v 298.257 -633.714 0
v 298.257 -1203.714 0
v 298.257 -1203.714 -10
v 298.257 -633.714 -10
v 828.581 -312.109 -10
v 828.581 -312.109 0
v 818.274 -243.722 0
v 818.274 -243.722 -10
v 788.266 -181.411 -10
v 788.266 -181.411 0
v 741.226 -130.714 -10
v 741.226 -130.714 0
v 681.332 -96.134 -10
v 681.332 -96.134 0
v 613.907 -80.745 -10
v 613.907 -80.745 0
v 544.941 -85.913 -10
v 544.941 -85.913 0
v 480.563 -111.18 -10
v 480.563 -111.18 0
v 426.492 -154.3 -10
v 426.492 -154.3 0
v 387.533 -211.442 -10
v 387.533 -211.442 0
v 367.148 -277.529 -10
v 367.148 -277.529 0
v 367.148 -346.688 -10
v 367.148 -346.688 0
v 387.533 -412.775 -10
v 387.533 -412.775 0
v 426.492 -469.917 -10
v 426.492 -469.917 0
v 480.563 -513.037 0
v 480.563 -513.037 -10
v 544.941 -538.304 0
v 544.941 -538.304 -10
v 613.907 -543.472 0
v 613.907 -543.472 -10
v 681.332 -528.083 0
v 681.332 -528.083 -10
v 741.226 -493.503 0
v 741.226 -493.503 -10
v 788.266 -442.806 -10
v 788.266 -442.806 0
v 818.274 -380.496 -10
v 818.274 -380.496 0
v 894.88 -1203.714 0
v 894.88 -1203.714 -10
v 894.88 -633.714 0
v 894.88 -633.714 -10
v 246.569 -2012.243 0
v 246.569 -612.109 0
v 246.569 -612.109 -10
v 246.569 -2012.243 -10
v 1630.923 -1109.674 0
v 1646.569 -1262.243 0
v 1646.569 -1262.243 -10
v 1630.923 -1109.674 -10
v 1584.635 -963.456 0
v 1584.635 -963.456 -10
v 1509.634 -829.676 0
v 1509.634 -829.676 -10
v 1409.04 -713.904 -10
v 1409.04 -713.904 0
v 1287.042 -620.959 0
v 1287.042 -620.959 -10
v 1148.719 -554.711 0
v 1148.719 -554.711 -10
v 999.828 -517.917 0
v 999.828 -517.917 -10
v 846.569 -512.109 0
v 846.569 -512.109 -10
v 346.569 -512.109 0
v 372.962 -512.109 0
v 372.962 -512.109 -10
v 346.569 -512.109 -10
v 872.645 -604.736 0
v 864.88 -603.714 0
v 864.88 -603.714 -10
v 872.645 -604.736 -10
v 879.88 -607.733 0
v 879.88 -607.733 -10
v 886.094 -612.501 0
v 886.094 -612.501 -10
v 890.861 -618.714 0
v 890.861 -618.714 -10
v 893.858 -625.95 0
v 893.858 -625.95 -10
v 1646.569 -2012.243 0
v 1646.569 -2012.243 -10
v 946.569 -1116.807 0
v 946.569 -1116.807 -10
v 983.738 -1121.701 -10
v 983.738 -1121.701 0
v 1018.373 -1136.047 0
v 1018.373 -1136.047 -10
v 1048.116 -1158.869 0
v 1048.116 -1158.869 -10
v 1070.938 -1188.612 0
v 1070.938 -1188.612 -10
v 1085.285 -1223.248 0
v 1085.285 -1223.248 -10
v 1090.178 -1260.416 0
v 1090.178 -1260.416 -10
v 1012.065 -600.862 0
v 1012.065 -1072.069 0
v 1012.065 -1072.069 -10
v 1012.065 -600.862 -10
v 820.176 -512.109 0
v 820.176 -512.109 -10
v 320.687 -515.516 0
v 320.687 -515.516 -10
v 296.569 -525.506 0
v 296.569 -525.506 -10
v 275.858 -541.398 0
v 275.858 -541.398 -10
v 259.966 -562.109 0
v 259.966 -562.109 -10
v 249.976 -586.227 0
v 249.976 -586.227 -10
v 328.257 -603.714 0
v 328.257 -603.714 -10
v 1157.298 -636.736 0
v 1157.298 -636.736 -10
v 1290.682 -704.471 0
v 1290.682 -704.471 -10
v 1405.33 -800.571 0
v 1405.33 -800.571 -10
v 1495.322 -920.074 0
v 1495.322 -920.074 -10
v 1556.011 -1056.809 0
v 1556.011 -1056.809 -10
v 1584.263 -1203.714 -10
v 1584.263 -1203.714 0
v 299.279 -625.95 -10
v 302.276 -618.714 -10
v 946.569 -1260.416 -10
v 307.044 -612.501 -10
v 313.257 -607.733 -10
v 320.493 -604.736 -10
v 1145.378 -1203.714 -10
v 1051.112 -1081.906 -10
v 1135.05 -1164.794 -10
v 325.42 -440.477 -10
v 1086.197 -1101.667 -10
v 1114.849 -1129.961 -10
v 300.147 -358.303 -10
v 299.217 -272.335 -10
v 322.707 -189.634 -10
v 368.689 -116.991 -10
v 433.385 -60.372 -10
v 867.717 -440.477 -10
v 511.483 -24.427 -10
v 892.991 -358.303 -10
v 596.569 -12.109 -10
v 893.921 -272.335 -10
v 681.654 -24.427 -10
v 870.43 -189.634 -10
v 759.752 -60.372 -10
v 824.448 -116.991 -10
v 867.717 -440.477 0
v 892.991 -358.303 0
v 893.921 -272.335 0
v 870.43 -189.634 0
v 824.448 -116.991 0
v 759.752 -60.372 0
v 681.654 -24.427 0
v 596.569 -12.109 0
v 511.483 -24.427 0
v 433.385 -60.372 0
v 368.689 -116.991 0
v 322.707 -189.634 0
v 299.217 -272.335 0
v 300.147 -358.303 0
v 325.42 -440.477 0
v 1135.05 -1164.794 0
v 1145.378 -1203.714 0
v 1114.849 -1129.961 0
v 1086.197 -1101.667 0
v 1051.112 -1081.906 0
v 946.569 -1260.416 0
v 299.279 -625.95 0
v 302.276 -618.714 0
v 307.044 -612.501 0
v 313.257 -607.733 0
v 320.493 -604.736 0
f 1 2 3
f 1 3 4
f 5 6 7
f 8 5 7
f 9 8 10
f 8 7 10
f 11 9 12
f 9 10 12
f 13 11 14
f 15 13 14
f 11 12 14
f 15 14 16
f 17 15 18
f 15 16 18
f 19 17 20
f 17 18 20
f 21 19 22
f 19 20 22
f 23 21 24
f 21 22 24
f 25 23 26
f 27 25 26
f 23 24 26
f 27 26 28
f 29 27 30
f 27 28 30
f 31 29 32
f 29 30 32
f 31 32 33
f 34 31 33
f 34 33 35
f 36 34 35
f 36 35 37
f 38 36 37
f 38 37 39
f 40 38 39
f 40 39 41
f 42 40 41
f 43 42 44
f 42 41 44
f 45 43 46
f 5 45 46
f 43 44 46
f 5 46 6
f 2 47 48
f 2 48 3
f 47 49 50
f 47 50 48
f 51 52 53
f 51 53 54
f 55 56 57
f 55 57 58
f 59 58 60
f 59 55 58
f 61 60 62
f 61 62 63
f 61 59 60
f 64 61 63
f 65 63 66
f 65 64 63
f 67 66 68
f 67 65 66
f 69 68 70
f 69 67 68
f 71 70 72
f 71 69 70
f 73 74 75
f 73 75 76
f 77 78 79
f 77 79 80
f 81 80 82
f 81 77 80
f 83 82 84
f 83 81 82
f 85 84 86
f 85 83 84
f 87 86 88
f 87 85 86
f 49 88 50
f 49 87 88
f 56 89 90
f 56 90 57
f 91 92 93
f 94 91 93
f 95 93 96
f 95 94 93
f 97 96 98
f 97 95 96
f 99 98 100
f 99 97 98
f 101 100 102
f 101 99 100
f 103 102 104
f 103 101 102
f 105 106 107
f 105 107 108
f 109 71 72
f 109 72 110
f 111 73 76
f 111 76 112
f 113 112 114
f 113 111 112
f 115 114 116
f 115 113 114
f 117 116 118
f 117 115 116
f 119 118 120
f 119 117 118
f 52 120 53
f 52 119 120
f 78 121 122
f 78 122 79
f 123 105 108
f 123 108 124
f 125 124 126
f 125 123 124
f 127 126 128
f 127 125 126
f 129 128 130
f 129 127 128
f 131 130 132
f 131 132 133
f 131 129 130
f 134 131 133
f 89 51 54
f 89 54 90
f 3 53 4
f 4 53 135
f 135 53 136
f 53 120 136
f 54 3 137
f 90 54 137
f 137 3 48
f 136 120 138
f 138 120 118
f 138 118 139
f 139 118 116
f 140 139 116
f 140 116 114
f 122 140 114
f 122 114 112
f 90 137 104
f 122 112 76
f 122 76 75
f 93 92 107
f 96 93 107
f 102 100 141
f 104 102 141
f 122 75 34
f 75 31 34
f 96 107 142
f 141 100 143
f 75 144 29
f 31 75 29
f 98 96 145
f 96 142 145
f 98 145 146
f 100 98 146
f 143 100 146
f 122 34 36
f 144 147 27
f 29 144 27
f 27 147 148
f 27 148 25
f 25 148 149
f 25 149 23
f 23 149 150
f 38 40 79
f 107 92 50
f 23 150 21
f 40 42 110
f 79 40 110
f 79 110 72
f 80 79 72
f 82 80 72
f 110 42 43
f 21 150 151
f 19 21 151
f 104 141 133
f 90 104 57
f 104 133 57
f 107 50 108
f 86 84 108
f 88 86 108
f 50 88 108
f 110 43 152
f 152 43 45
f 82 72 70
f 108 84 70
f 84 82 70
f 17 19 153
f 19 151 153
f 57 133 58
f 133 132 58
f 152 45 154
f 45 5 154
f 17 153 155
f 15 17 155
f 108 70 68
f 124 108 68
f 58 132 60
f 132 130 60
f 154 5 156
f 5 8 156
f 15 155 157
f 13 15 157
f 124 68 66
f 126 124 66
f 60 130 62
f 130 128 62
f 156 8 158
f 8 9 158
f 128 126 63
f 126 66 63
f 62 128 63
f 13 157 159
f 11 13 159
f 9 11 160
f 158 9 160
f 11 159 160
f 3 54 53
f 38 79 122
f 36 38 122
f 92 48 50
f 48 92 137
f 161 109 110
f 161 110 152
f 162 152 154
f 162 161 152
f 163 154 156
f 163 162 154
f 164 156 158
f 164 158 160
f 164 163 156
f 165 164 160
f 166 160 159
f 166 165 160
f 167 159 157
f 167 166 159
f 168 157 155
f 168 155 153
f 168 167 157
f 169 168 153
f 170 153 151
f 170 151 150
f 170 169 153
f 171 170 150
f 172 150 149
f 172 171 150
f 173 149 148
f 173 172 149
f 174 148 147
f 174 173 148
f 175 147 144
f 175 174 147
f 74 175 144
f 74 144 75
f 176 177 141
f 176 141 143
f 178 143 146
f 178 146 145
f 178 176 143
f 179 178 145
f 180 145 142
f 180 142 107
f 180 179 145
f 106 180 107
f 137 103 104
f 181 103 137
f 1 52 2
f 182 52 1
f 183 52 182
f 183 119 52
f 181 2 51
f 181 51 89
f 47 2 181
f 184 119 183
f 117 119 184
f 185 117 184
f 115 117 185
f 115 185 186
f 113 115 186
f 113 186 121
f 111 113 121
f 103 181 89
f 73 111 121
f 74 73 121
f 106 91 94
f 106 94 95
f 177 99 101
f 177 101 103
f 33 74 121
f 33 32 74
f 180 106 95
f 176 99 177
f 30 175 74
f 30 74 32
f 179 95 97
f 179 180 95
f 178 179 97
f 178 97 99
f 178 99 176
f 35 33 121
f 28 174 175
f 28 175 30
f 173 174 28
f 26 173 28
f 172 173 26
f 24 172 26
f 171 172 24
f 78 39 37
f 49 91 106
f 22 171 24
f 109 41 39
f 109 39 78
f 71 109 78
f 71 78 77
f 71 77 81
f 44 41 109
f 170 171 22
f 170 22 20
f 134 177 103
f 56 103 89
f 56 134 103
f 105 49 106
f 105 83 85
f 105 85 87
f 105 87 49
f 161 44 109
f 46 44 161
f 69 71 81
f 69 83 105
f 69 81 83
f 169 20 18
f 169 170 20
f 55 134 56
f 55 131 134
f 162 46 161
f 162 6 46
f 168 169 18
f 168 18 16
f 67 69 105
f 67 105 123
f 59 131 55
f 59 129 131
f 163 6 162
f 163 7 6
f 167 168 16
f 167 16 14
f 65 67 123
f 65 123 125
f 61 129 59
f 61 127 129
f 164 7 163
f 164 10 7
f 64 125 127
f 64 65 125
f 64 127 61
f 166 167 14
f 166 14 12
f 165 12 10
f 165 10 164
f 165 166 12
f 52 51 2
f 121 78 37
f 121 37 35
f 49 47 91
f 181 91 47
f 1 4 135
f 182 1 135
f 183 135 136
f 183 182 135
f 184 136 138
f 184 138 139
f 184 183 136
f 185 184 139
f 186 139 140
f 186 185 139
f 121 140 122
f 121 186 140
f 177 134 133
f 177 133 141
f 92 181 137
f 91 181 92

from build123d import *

# Parameters (mm, degrees)
SKETCH1_R           = 232.012436726
BOSS_EXTRUDE2_DEPTH = 10


with BuildPart() as part:
    # Sketch1 → Boss-Extrude2 (new body)
    with BuildSketch(Plane.XY):
        with BuildLine():
            Line((846.568769473, -512.108653834), (820.175567223, -512.108653834))
            ThreePointArc((820.175567223, -512.108653834), (596.568769473, -12.108653834), (372.961971723, -512.108653834))
            Line((372.961971723, -512.108653834), (346.568769473, -512.108653834))
            ThreePointArc((346.568769473, -512.108653834), (275.858091355, -541.397975715), (246.568769473, -612.108653834))
            Line((246.568769473, -612.108653834), (246.568769473, -1812.108653834))
            Line((246.568769473, -1812.108653834), (246.568769473, -2012.242939545))
            Line((246.568769473, -2012.242939545), (946.568769473, -2012.242939545))
            Line((946.568769473, -2012.242939545), (1646.568769473, -2012.242939545))
            Line((1646.568769473, -2012.242939545), (1646.568769473, -1812.108653834))
            Line((1646.568769473, -1812.108653834), (1646.568769473, -1262.242939545))
            ThreePointArc((1646.568769473, -1262.242939545), (1409.039966295, -713.90421061), (846.568769473, -512.108653834))
        make_face()
        with BuildLine():
            Line((946.568769473, -1260.416440178), (946.568769473, -1116.807153033))
            ThreePointArc((946.568769473, -1116.807153033), (1048.115870255, -1158.869339396), (1090.178056619, -1260.416440178))
            Line((1090.178056619, -1260.416440178), (946.568769473, -1260.416440178))
        make_face(mode=Mode.SUBTRACT)
        with BuildLine():
            ThreePointArc((298.257173598, -633.714224791), (307.043970163, -612.501021355), (328.257173598, -603.714224791))
            Line((328.257173598, -603.714224791), (864.880365349, -603.714224791))
            ThreePointArc((864.880365349, -603.714224791), (886.093568784, -612.501021355), (894.880365349, -633.714224791))
            Line((894.880365349, -633.714224791), (894.880365349, -1203.714224791))
            Line((894.880365349, -1203.714224791), (298.257173598, -1203.714224791))
            Line((298.257173598, -1203.714224791), (298.257173598, -633.714224791))
        make_face(mode=Mode.SUBTRACT)
        with Locations((596.568769473, -312.108653834)):
            Circle(SKETCH1_R, mode=Mode.SUBTRACT)
        with BuildLine():
            Line((1012.065009988, -1072.068666538), (1012.065009988, -600.862482616))
            ThreePointArc((1012.065009988, -600.862482616), (1405.330319639, -800.571245417), (1584.263077669, -1203.714224791))
            Line((1584.263077669, -1203.714224791), (1145.378172354, -1203.714224791))
            ThreePointArc((1145.378172354, -1203.714224791), (1101.465382273, -1114.859550352), (1012.065009988, -1072.068666538))
        make_face(mode=Mode.SUBTRACT)
    extrude(amount=-BOSS_EXTRUDE2_DEPTH)


solid = part.part
